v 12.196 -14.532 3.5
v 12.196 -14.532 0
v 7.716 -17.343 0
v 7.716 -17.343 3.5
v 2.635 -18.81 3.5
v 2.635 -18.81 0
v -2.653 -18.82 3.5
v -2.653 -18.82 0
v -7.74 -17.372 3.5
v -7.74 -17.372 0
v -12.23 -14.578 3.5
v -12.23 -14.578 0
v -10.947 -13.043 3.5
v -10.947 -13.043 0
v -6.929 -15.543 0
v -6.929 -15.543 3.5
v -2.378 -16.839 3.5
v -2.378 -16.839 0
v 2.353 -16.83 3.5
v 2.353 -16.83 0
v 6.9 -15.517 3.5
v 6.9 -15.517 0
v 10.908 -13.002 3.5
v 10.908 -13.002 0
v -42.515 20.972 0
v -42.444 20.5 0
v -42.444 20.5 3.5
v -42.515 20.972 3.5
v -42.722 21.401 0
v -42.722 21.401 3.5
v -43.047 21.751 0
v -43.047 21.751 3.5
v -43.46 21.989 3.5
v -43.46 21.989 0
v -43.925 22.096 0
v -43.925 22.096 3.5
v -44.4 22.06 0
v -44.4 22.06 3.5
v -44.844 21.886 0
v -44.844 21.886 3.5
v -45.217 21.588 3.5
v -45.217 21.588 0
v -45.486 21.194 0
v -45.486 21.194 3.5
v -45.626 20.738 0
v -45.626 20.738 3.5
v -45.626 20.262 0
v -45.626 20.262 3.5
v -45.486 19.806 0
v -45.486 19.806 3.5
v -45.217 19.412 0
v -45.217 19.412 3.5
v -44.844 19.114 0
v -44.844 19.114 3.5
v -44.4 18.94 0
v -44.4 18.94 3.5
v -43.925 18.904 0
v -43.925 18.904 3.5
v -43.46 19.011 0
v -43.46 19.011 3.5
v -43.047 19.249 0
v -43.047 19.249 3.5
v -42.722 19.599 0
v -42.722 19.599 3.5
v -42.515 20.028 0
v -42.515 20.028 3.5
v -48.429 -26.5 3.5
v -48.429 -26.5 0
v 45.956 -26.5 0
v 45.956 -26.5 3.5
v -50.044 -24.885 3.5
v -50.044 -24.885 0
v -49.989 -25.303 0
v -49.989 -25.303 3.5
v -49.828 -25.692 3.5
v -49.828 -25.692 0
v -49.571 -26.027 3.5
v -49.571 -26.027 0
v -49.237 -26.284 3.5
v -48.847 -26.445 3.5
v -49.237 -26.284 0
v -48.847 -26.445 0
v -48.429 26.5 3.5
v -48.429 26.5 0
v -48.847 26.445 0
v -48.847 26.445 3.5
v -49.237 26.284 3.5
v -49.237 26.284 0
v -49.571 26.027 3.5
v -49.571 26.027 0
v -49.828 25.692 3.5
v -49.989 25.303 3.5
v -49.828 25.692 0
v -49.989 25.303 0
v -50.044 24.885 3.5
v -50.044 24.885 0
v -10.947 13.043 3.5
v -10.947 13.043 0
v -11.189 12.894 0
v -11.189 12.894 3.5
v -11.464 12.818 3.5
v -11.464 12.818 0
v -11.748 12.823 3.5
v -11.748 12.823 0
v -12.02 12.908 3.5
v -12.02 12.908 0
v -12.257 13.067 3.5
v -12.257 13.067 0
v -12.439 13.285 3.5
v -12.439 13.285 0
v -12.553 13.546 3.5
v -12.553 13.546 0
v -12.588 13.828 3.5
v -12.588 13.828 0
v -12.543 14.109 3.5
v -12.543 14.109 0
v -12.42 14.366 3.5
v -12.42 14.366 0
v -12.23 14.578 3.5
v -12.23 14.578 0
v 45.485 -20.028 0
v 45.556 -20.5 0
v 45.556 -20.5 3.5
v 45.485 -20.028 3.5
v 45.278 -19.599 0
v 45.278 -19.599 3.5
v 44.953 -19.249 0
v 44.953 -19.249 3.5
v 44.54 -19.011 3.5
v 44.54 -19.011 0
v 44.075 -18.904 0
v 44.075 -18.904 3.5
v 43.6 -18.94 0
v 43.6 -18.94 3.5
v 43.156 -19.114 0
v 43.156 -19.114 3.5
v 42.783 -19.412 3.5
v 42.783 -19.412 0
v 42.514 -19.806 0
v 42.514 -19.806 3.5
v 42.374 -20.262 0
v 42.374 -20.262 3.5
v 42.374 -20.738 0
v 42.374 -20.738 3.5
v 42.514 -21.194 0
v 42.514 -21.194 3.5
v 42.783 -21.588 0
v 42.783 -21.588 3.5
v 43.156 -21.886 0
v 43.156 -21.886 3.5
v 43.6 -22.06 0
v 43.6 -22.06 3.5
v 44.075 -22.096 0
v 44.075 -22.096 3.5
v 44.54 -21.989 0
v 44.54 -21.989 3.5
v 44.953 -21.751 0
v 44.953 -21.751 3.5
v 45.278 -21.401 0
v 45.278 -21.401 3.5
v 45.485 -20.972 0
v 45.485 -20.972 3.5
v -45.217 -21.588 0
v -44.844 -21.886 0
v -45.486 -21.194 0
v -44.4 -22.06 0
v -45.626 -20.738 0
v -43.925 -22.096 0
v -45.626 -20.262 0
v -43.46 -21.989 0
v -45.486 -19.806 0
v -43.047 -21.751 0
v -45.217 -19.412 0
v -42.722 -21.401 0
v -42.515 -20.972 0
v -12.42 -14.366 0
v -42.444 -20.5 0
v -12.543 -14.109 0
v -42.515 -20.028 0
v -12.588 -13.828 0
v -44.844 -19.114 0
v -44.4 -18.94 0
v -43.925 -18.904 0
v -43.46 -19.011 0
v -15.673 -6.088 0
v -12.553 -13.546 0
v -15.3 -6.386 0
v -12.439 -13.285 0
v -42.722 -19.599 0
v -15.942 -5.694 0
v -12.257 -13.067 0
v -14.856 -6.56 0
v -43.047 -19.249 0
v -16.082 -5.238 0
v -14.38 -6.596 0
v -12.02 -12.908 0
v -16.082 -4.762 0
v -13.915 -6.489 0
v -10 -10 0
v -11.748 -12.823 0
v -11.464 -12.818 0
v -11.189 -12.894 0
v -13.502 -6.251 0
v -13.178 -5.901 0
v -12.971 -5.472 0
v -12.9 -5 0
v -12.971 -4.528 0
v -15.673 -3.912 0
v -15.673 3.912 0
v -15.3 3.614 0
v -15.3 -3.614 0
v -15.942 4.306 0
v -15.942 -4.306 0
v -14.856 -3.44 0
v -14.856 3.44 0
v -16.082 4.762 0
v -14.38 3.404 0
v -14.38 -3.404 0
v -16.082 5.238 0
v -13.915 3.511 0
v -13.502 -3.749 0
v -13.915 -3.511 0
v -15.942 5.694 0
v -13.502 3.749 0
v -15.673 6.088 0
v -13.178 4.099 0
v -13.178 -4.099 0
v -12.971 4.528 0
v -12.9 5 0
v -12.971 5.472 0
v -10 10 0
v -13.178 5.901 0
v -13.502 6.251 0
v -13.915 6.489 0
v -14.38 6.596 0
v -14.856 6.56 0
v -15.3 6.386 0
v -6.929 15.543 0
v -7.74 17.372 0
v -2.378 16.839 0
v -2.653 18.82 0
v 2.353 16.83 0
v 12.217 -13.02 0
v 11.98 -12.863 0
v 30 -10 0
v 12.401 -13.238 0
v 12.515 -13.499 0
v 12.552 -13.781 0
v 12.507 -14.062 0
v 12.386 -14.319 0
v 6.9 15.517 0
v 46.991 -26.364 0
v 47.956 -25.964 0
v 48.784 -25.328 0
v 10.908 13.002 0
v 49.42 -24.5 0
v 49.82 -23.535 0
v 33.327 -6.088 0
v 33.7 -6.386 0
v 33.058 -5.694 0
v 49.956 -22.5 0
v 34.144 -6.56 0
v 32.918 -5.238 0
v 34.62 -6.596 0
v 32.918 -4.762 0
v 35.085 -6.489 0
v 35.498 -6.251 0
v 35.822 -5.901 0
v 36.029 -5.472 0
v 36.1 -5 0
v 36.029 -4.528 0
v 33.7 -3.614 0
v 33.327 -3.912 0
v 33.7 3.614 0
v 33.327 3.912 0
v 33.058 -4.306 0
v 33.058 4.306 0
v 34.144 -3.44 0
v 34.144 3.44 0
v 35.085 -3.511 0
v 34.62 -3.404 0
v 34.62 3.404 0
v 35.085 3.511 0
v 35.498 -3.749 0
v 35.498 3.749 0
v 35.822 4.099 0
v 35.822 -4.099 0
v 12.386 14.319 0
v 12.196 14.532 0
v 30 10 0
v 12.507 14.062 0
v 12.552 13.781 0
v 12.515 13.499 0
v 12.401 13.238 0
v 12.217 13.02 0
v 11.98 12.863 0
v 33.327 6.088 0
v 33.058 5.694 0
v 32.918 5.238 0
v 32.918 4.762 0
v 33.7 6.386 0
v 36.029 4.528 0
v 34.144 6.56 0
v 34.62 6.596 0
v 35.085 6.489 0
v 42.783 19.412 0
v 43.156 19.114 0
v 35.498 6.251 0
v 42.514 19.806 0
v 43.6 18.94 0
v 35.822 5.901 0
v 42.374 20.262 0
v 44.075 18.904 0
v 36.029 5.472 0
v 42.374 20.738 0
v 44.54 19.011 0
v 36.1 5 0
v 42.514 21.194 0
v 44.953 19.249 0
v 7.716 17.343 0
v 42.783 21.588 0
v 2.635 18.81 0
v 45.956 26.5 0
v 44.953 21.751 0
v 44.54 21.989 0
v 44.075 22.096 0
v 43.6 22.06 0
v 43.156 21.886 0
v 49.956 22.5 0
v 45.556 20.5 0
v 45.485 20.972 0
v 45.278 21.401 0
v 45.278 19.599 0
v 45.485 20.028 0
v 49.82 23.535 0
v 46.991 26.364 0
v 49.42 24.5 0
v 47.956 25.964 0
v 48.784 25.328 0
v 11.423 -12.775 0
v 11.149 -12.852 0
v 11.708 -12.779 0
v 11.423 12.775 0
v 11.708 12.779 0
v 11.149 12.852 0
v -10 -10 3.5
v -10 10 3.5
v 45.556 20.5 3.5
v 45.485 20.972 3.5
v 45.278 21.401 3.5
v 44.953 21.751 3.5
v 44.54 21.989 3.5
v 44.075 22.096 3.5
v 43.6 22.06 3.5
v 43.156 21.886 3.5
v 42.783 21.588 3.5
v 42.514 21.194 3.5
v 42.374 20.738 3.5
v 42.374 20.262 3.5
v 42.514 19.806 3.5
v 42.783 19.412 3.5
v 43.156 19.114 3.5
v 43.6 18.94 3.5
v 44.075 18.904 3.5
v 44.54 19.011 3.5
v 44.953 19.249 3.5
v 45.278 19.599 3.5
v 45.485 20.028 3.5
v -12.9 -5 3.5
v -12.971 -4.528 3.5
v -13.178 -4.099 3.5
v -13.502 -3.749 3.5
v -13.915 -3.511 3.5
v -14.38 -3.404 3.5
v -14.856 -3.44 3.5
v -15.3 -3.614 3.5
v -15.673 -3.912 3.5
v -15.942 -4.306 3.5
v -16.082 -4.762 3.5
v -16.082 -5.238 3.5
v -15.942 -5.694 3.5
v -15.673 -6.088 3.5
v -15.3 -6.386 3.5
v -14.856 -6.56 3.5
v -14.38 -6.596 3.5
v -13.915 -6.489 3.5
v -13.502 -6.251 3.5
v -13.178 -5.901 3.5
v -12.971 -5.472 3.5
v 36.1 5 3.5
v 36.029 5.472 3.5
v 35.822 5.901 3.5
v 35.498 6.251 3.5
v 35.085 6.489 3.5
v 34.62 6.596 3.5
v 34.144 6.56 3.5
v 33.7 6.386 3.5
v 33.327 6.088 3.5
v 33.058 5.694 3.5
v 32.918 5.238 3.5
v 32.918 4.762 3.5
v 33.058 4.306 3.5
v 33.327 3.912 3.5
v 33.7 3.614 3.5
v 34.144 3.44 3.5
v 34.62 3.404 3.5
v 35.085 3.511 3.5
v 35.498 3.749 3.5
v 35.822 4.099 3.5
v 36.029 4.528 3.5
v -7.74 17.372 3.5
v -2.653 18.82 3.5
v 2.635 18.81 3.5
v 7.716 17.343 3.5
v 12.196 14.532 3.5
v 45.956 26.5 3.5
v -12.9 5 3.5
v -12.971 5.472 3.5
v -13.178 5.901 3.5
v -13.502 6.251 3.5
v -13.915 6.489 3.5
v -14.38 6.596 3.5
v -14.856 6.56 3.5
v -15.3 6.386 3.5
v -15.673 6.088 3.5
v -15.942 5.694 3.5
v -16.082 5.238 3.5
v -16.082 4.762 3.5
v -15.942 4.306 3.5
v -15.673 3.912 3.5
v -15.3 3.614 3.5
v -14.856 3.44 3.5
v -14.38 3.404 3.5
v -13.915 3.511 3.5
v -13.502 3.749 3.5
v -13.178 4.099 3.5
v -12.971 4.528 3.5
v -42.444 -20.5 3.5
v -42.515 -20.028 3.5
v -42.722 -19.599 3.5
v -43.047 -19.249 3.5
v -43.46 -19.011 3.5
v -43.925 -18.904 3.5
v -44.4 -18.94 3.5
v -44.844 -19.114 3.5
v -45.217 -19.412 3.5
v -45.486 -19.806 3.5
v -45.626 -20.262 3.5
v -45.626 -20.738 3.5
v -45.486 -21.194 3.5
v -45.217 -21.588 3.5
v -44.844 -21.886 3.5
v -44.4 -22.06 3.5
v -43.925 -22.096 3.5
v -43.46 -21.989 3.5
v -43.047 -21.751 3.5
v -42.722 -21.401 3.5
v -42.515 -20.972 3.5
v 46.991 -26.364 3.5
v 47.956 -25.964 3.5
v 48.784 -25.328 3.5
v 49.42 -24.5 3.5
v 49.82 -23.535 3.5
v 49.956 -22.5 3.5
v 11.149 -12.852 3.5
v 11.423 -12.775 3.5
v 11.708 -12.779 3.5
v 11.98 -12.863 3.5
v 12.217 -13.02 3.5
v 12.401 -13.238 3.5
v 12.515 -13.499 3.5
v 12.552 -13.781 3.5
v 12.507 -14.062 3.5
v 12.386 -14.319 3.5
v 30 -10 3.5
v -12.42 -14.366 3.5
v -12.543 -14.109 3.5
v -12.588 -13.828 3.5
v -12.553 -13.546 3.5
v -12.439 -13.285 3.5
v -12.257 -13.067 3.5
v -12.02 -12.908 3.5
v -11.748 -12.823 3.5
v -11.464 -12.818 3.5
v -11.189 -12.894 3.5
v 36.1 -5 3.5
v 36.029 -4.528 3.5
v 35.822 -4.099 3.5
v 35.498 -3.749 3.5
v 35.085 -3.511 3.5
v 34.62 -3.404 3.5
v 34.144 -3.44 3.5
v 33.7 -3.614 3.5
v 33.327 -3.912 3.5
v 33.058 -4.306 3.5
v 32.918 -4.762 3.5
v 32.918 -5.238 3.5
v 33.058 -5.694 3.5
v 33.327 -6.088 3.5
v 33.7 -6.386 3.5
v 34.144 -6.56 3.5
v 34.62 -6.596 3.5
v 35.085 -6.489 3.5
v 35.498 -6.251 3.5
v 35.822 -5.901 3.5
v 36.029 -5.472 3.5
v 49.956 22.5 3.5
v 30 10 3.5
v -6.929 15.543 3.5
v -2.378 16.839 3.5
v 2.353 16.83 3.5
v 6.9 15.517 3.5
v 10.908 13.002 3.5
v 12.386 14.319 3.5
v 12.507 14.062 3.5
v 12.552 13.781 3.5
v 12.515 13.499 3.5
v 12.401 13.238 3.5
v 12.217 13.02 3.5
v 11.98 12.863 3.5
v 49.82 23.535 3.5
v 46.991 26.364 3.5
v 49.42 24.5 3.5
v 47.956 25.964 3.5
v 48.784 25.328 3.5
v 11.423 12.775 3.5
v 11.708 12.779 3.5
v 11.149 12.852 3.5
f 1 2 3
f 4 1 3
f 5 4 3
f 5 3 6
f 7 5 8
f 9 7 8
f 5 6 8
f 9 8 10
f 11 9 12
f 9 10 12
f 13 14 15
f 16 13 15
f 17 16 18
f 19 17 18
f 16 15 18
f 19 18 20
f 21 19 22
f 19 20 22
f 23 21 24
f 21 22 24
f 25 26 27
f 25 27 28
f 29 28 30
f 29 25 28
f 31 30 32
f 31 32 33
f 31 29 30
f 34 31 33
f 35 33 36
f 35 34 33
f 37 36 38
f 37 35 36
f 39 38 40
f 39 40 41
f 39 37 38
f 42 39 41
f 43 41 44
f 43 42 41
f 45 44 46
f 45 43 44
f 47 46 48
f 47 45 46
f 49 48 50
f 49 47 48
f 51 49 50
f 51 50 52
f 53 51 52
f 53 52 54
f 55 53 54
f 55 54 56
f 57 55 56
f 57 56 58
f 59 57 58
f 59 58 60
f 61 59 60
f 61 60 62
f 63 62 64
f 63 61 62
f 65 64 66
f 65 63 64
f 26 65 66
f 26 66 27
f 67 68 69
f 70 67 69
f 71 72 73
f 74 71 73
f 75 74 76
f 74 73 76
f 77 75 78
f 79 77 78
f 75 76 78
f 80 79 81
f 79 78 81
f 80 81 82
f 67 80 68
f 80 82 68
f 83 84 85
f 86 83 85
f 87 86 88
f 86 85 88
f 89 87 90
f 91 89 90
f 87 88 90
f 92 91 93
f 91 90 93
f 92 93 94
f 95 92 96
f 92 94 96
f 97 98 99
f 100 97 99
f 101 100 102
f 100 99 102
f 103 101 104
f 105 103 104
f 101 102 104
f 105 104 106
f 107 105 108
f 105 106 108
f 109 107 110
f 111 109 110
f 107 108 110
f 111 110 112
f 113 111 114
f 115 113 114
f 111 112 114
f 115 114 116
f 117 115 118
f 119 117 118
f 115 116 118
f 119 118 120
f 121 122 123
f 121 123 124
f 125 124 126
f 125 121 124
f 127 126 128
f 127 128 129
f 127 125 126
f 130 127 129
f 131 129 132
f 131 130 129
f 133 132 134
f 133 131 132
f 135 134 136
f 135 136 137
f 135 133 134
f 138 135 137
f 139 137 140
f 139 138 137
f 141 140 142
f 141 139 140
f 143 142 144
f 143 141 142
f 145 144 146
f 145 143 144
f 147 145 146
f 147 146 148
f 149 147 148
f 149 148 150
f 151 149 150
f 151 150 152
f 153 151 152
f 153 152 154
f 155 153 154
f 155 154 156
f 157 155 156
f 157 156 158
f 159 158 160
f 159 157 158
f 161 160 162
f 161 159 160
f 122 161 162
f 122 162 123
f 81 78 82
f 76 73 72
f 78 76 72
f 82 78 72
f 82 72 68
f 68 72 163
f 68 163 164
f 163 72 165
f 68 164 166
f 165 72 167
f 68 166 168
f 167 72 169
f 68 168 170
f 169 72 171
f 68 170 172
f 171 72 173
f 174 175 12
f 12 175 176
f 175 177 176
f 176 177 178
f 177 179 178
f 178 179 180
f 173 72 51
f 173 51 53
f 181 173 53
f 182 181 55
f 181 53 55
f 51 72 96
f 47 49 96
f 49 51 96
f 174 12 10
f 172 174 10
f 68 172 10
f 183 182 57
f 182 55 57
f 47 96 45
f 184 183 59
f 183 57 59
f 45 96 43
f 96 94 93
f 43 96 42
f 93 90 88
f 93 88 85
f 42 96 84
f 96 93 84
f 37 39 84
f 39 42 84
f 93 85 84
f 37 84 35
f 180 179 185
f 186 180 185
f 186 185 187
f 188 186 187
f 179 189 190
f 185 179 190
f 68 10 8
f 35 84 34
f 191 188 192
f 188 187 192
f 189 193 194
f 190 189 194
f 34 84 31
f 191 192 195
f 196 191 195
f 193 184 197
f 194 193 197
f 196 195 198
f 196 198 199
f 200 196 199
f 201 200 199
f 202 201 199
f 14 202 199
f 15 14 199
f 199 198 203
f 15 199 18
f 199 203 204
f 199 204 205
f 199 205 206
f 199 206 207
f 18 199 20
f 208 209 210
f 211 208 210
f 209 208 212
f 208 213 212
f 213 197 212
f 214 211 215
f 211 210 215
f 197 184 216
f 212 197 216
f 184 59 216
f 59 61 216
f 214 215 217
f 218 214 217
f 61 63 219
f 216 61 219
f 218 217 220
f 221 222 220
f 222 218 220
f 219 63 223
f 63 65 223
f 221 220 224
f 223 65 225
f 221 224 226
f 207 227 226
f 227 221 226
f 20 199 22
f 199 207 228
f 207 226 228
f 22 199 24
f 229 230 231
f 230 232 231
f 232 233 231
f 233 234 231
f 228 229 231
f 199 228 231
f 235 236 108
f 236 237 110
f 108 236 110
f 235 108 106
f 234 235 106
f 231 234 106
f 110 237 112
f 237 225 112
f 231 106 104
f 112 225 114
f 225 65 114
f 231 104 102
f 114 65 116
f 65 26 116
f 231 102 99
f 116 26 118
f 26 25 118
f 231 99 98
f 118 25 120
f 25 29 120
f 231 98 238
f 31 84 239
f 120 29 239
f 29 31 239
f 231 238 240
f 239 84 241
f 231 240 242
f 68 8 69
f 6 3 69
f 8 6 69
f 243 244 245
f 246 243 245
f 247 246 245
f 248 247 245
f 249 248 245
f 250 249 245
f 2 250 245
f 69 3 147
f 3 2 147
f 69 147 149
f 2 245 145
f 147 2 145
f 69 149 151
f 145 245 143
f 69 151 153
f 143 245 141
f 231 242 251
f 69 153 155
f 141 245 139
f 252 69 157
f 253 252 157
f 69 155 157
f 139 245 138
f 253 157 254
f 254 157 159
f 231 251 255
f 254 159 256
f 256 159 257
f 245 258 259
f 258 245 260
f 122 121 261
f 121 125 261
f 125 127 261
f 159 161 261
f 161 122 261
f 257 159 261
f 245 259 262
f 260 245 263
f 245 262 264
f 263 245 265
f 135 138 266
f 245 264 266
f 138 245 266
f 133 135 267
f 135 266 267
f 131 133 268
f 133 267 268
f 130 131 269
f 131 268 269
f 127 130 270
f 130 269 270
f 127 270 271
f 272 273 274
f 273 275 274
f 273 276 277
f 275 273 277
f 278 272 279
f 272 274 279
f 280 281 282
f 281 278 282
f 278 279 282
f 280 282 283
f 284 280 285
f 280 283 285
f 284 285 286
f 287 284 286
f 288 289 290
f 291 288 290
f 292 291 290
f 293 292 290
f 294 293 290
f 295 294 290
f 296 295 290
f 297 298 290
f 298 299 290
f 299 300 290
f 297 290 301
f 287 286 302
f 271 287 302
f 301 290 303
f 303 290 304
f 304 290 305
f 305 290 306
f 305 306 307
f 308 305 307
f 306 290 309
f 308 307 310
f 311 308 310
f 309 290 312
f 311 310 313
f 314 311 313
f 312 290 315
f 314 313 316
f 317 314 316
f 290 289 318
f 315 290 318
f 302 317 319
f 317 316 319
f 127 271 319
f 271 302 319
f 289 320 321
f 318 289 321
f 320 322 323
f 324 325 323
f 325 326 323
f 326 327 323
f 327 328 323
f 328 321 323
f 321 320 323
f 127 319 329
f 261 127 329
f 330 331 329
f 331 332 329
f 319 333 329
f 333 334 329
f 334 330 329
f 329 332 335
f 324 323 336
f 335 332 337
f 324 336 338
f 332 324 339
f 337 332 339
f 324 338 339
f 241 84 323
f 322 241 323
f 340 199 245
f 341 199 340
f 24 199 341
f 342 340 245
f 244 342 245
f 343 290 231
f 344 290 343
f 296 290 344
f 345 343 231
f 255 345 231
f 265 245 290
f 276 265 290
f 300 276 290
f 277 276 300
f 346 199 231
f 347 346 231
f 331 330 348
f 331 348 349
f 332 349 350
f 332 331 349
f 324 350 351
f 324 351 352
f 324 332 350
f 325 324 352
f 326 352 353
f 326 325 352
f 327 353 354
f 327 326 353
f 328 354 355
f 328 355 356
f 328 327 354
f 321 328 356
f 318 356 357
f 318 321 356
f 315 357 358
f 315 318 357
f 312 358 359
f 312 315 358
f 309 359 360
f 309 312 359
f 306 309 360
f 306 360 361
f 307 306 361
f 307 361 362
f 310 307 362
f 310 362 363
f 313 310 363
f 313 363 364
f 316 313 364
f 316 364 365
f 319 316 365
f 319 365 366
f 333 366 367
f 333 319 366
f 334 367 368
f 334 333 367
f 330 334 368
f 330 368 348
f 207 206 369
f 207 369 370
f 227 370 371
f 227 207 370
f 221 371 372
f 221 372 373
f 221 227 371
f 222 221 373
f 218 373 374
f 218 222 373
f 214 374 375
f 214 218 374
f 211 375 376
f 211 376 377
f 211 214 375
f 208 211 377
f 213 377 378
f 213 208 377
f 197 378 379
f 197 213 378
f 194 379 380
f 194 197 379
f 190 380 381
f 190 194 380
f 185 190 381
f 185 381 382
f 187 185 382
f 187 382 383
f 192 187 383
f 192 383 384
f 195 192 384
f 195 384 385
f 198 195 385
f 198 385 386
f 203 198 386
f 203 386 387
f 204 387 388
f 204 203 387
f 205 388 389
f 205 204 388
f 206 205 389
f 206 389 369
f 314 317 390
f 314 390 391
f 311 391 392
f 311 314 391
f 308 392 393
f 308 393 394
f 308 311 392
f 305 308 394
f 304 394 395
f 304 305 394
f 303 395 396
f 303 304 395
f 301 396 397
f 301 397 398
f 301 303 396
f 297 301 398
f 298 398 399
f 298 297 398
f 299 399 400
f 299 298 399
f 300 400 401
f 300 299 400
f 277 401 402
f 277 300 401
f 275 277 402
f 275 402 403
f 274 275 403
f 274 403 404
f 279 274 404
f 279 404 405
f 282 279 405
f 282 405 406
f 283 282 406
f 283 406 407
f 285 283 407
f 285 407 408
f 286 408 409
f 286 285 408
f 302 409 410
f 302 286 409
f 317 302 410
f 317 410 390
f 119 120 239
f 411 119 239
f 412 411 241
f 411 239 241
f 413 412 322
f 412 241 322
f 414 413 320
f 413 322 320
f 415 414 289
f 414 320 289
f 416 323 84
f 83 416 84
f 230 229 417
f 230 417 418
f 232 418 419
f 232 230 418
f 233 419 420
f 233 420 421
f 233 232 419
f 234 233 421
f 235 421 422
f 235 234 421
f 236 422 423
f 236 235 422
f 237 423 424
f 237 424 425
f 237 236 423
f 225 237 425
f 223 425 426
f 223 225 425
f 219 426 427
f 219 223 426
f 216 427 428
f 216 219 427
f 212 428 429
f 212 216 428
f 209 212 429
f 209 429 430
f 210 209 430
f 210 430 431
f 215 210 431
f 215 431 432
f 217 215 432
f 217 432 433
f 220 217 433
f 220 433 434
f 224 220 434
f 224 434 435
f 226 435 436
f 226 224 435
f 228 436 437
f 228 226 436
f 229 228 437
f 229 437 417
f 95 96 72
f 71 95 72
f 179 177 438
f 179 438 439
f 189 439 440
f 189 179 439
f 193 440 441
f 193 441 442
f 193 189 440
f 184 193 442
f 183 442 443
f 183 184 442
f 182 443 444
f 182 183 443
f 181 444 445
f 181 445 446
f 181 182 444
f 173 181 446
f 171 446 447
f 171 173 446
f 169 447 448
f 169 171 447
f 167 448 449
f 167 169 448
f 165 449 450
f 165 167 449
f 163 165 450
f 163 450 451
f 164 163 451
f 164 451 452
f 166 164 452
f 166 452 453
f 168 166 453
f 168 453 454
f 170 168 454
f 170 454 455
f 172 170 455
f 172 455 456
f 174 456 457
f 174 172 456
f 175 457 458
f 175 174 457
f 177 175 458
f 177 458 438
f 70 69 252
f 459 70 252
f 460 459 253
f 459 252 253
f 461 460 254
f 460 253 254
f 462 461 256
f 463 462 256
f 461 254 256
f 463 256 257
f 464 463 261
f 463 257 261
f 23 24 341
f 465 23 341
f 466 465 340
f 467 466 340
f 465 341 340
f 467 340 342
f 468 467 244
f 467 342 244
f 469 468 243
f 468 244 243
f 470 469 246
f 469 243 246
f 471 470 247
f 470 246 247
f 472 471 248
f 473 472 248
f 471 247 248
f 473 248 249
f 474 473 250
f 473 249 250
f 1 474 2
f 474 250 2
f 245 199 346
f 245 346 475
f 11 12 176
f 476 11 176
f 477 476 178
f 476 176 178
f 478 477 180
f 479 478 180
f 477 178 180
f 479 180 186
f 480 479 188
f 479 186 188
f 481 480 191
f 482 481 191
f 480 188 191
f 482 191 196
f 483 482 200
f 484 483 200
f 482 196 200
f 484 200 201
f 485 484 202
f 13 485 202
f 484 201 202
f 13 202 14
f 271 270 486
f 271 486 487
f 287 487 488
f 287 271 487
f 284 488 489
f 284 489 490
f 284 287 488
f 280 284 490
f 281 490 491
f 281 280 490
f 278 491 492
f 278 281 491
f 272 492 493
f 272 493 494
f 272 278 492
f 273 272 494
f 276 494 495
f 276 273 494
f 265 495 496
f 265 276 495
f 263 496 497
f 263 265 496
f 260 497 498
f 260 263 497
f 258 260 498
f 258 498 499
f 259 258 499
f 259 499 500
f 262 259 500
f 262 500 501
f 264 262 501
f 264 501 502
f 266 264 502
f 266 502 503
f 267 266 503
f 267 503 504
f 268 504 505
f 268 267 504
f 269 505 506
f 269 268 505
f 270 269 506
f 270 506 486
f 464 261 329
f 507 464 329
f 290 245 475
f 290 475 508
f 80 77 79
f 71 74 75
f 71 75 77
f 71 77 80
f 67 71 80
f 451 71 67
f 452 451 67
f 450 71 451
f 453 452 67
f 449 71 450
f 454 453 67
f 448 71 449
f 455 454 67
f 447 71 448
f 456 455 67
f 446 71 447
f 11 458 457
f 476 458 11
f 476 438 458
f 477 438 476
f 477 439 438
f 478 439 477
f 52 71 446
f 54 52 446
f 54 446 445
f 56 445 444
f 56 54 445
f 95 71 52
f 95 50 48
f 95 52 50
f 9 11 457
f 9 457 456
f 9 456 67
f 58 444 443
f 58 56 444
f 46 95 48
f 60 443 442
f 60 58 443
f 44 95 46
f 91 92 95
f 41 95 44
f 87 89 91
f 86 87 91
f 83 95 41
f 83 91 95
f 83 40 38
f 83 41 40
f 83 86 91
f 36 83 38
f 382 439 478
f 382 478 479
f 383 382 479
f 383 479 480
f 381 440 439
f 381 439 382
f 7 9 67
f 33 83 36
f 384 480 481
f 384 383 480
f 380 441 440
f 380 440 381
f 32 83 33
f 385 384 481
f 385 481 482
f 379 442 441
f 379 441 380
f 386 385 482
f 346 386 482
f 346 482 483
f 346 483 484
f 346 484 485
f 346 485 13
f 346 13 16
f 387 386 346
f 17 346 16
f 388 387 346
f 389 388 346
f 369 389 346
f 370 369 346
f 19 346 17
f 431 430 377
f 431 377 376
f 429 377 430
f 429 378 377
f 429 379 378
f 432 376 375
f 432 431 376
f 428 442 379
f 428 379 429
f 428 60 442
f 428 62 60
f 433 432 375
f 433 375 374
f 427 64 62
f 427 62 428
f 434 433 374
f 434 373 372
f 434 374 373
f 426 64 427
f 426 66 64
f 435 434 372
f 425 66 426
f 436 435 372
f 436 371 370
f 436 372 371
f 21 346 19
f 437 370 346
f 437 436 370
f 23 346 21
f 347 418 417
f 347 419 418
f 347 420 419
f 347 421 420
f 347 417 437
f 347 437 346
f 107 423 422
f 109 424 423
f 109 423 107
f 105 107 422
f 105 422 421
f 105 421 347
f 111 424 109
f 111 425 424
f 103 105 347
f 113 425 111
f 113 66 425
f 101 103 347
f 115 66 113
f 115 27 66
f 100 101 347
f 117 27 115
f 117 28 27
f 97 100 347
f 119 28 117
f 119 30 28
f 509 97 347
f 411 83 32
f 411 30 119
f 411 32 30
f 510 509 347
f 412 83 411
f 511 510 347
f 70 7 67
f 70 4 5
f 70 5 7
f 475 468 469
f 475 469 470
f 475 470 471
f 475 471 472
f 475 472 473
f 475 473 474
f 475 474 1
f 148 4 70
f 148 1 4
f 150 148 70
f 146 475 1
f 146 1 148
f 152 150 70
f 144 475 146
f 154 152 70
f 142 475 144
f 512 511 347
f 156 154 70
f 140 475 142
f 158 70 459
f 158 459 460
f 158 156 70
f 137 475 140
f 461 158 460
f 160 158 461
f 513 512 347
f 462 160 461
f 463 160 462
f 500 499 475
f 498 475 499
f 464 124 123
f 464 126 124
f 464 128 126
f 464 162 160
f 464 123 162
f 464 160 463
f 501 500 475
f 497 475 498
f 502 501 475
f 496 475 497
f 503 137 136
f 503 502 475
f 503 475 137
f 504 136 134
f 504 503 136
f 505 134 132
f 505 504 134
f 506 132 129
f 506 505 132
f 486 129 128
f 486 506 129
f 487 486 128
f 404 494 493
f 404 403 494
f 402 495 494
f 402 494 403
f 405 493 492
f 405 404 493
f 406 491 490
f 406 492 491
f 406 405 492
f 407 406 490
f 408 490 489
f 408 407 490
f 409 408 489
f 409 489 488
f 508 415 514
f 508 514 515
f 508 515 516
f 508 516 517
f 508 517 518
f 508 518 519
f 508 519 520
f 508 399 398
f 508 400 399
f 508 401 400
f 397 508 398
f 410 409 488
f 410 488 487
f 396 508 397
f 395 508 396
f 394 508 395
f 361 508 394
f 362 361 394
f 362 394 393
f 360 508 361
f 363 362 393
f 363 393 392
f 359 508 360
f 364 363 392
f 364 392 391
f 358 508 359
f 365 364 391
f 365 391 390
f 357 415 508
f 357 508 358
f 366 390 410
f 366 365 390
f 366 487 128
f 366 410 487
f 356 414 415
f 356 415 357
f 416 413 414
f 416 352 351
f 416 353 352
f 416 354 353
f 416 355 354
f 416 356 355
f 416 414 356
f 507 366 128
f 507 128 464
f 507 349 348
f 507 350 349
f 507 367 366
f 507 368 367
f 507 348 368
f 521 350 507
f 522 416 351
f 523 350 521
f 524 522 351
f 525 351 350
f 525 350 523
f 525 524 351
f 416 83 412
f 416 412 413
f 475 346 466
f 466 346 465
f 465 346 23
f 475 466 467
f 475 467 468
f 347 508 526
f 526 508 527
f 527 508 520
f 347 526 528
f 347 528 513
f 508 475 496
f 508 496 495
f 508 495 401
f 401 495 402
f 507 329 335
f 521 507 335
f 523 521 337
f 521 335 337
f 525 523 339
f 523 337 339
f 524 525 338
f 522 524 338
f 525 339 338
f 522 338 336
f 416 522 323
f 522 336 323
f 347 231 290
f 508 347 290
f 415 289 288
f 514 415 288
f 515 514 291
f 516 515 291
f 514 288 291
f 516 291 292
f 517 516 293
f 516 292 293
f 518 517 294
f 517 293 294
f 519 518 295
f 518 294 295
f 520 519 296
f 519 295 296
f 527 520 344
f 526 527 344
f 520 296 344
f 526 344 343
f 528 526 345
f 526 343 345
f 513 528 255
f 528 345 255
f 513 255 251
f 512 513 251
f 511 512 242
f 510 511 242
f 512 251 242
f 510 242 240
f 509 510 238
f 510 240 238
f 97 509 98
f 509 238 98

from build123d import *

# Parameters (mm, degrees)
SKETCH1_R           = 1.6
SKETCH1_W           = 40
SKETCH1_H           = 20
BOSS_EXTRUDE1_DEPTH = 3.5


with BuildPart() as part:
    # Sketch1 → Boss-Extrude1 (new body)
    with BuildSketch(Plane.XY):
        with BuildLine():
            ThreePointArc((-50.044200549, -24.884800983), (-49.571119709, -26.026919161), (-48.429001531, -26.5))
            Line((-48.429001531, -26.5), (45.955799451, -26.5))
            ThreePointArc((45.955799451, -26.5), (48.784226576, -25.328427125), (49.955799451, -22.5))
            Line((49.955799451, -22.5), (49.955799451, 22.5))
            ThreePointArc((49.955799451, 22.5), (48.784226576, 25.328427125), (45.955799451, 26.5))
            Line((45.955799451, 26.5), (-48.429001531, 26.5))
            ThreePointArc((-48.429001531, 26.5), (-49.571119709, 26.026919161), (-50.044200549, 24.884800983))
            Line((-50.044200549, 24.884800983), (-50.044200549, -24.884800983))
        make_face()
        with Locations((-44.044200549, -20.5)):
            Circle(SKETCH1_R, mode=Mode.SUBTRACT)
        with Locations((-14.5, -5)):
            Circle(SKETCH1_R, mode=Mode.SUBTRACT)
        with BuildLine():
            ThreePointArc((12.196121371, -14.531845007), (-0.008459876, -18.999966384), (-12.229764581, -14.57779233))
            ThreePointArc((-12.229764581, -14.57779233), (-12.355671334, -13.169194626), (-10.94707363, -13.043287874))
            ThreePointArc((-10.94707363, -13.043287874), (-0.012222052, -16.999969923), (10.907666432, -13.002177111))
            ThreePointArc((10.907666432, -13.002177111), (12.31672785, -13.122783589), (12.196121371, -14.531845007))
        make_face(mode=Mode.SUBTRACT)
        with Locations((43.955799451, -20.5)):
            Circle(SKETCH1_R, mode=Mode.SUBTRACT)
        with Locations((34.5, -5)):
            Circle(SKETCH1_R, mode=Mode.SUBTRACT)
        with Locations((-14.5, 5)):
            Circle(SKETCH1_R, mode=Mode.SUBTRACT)
        with Locations((-44.044200549, 20.5)):
            Circle(SKETCH1_R, mode=Mode.SUBTRACT)
        with Locations((10, 0)):
            Rectangle(SKETCH1_W, SKETCH1_H, mode=Mode.SUBTRACT)
        with Locations((34.5, 5)):
            Circle(SKETCH1_R, mode=Mode.SUBTRACT)
        with BuildLine():
            ThreePointArc((-10.94707363, 13.043287874), (-12.355671334, 13.169194626), (-12.229764581, 14.57779233))
            ThreePointArc((-12.229764581, 14.57779233), (-0.008459876, 18.999966384), (12.196121371, 14.531845007))
            ThreePointArc((12.196121371, 14.531845007), (12.31672785, 13.122783589), (10.907666432, 13.002177111))
            ThreePointArc((10.907666432, 13.002177111), (-0.012222052, 16.999969923), (-10.94707363, 13.043287874))
        make_face(mode=Mode.SUBTRACT)
        with Locations((43.955799451, 20.5)):
            Circle(SKETCH1_R, mode=Mode.SUBTRACT)
    extrude(amount=BOSS_EXTRUDE1_DEPTH)


solid = part.part
